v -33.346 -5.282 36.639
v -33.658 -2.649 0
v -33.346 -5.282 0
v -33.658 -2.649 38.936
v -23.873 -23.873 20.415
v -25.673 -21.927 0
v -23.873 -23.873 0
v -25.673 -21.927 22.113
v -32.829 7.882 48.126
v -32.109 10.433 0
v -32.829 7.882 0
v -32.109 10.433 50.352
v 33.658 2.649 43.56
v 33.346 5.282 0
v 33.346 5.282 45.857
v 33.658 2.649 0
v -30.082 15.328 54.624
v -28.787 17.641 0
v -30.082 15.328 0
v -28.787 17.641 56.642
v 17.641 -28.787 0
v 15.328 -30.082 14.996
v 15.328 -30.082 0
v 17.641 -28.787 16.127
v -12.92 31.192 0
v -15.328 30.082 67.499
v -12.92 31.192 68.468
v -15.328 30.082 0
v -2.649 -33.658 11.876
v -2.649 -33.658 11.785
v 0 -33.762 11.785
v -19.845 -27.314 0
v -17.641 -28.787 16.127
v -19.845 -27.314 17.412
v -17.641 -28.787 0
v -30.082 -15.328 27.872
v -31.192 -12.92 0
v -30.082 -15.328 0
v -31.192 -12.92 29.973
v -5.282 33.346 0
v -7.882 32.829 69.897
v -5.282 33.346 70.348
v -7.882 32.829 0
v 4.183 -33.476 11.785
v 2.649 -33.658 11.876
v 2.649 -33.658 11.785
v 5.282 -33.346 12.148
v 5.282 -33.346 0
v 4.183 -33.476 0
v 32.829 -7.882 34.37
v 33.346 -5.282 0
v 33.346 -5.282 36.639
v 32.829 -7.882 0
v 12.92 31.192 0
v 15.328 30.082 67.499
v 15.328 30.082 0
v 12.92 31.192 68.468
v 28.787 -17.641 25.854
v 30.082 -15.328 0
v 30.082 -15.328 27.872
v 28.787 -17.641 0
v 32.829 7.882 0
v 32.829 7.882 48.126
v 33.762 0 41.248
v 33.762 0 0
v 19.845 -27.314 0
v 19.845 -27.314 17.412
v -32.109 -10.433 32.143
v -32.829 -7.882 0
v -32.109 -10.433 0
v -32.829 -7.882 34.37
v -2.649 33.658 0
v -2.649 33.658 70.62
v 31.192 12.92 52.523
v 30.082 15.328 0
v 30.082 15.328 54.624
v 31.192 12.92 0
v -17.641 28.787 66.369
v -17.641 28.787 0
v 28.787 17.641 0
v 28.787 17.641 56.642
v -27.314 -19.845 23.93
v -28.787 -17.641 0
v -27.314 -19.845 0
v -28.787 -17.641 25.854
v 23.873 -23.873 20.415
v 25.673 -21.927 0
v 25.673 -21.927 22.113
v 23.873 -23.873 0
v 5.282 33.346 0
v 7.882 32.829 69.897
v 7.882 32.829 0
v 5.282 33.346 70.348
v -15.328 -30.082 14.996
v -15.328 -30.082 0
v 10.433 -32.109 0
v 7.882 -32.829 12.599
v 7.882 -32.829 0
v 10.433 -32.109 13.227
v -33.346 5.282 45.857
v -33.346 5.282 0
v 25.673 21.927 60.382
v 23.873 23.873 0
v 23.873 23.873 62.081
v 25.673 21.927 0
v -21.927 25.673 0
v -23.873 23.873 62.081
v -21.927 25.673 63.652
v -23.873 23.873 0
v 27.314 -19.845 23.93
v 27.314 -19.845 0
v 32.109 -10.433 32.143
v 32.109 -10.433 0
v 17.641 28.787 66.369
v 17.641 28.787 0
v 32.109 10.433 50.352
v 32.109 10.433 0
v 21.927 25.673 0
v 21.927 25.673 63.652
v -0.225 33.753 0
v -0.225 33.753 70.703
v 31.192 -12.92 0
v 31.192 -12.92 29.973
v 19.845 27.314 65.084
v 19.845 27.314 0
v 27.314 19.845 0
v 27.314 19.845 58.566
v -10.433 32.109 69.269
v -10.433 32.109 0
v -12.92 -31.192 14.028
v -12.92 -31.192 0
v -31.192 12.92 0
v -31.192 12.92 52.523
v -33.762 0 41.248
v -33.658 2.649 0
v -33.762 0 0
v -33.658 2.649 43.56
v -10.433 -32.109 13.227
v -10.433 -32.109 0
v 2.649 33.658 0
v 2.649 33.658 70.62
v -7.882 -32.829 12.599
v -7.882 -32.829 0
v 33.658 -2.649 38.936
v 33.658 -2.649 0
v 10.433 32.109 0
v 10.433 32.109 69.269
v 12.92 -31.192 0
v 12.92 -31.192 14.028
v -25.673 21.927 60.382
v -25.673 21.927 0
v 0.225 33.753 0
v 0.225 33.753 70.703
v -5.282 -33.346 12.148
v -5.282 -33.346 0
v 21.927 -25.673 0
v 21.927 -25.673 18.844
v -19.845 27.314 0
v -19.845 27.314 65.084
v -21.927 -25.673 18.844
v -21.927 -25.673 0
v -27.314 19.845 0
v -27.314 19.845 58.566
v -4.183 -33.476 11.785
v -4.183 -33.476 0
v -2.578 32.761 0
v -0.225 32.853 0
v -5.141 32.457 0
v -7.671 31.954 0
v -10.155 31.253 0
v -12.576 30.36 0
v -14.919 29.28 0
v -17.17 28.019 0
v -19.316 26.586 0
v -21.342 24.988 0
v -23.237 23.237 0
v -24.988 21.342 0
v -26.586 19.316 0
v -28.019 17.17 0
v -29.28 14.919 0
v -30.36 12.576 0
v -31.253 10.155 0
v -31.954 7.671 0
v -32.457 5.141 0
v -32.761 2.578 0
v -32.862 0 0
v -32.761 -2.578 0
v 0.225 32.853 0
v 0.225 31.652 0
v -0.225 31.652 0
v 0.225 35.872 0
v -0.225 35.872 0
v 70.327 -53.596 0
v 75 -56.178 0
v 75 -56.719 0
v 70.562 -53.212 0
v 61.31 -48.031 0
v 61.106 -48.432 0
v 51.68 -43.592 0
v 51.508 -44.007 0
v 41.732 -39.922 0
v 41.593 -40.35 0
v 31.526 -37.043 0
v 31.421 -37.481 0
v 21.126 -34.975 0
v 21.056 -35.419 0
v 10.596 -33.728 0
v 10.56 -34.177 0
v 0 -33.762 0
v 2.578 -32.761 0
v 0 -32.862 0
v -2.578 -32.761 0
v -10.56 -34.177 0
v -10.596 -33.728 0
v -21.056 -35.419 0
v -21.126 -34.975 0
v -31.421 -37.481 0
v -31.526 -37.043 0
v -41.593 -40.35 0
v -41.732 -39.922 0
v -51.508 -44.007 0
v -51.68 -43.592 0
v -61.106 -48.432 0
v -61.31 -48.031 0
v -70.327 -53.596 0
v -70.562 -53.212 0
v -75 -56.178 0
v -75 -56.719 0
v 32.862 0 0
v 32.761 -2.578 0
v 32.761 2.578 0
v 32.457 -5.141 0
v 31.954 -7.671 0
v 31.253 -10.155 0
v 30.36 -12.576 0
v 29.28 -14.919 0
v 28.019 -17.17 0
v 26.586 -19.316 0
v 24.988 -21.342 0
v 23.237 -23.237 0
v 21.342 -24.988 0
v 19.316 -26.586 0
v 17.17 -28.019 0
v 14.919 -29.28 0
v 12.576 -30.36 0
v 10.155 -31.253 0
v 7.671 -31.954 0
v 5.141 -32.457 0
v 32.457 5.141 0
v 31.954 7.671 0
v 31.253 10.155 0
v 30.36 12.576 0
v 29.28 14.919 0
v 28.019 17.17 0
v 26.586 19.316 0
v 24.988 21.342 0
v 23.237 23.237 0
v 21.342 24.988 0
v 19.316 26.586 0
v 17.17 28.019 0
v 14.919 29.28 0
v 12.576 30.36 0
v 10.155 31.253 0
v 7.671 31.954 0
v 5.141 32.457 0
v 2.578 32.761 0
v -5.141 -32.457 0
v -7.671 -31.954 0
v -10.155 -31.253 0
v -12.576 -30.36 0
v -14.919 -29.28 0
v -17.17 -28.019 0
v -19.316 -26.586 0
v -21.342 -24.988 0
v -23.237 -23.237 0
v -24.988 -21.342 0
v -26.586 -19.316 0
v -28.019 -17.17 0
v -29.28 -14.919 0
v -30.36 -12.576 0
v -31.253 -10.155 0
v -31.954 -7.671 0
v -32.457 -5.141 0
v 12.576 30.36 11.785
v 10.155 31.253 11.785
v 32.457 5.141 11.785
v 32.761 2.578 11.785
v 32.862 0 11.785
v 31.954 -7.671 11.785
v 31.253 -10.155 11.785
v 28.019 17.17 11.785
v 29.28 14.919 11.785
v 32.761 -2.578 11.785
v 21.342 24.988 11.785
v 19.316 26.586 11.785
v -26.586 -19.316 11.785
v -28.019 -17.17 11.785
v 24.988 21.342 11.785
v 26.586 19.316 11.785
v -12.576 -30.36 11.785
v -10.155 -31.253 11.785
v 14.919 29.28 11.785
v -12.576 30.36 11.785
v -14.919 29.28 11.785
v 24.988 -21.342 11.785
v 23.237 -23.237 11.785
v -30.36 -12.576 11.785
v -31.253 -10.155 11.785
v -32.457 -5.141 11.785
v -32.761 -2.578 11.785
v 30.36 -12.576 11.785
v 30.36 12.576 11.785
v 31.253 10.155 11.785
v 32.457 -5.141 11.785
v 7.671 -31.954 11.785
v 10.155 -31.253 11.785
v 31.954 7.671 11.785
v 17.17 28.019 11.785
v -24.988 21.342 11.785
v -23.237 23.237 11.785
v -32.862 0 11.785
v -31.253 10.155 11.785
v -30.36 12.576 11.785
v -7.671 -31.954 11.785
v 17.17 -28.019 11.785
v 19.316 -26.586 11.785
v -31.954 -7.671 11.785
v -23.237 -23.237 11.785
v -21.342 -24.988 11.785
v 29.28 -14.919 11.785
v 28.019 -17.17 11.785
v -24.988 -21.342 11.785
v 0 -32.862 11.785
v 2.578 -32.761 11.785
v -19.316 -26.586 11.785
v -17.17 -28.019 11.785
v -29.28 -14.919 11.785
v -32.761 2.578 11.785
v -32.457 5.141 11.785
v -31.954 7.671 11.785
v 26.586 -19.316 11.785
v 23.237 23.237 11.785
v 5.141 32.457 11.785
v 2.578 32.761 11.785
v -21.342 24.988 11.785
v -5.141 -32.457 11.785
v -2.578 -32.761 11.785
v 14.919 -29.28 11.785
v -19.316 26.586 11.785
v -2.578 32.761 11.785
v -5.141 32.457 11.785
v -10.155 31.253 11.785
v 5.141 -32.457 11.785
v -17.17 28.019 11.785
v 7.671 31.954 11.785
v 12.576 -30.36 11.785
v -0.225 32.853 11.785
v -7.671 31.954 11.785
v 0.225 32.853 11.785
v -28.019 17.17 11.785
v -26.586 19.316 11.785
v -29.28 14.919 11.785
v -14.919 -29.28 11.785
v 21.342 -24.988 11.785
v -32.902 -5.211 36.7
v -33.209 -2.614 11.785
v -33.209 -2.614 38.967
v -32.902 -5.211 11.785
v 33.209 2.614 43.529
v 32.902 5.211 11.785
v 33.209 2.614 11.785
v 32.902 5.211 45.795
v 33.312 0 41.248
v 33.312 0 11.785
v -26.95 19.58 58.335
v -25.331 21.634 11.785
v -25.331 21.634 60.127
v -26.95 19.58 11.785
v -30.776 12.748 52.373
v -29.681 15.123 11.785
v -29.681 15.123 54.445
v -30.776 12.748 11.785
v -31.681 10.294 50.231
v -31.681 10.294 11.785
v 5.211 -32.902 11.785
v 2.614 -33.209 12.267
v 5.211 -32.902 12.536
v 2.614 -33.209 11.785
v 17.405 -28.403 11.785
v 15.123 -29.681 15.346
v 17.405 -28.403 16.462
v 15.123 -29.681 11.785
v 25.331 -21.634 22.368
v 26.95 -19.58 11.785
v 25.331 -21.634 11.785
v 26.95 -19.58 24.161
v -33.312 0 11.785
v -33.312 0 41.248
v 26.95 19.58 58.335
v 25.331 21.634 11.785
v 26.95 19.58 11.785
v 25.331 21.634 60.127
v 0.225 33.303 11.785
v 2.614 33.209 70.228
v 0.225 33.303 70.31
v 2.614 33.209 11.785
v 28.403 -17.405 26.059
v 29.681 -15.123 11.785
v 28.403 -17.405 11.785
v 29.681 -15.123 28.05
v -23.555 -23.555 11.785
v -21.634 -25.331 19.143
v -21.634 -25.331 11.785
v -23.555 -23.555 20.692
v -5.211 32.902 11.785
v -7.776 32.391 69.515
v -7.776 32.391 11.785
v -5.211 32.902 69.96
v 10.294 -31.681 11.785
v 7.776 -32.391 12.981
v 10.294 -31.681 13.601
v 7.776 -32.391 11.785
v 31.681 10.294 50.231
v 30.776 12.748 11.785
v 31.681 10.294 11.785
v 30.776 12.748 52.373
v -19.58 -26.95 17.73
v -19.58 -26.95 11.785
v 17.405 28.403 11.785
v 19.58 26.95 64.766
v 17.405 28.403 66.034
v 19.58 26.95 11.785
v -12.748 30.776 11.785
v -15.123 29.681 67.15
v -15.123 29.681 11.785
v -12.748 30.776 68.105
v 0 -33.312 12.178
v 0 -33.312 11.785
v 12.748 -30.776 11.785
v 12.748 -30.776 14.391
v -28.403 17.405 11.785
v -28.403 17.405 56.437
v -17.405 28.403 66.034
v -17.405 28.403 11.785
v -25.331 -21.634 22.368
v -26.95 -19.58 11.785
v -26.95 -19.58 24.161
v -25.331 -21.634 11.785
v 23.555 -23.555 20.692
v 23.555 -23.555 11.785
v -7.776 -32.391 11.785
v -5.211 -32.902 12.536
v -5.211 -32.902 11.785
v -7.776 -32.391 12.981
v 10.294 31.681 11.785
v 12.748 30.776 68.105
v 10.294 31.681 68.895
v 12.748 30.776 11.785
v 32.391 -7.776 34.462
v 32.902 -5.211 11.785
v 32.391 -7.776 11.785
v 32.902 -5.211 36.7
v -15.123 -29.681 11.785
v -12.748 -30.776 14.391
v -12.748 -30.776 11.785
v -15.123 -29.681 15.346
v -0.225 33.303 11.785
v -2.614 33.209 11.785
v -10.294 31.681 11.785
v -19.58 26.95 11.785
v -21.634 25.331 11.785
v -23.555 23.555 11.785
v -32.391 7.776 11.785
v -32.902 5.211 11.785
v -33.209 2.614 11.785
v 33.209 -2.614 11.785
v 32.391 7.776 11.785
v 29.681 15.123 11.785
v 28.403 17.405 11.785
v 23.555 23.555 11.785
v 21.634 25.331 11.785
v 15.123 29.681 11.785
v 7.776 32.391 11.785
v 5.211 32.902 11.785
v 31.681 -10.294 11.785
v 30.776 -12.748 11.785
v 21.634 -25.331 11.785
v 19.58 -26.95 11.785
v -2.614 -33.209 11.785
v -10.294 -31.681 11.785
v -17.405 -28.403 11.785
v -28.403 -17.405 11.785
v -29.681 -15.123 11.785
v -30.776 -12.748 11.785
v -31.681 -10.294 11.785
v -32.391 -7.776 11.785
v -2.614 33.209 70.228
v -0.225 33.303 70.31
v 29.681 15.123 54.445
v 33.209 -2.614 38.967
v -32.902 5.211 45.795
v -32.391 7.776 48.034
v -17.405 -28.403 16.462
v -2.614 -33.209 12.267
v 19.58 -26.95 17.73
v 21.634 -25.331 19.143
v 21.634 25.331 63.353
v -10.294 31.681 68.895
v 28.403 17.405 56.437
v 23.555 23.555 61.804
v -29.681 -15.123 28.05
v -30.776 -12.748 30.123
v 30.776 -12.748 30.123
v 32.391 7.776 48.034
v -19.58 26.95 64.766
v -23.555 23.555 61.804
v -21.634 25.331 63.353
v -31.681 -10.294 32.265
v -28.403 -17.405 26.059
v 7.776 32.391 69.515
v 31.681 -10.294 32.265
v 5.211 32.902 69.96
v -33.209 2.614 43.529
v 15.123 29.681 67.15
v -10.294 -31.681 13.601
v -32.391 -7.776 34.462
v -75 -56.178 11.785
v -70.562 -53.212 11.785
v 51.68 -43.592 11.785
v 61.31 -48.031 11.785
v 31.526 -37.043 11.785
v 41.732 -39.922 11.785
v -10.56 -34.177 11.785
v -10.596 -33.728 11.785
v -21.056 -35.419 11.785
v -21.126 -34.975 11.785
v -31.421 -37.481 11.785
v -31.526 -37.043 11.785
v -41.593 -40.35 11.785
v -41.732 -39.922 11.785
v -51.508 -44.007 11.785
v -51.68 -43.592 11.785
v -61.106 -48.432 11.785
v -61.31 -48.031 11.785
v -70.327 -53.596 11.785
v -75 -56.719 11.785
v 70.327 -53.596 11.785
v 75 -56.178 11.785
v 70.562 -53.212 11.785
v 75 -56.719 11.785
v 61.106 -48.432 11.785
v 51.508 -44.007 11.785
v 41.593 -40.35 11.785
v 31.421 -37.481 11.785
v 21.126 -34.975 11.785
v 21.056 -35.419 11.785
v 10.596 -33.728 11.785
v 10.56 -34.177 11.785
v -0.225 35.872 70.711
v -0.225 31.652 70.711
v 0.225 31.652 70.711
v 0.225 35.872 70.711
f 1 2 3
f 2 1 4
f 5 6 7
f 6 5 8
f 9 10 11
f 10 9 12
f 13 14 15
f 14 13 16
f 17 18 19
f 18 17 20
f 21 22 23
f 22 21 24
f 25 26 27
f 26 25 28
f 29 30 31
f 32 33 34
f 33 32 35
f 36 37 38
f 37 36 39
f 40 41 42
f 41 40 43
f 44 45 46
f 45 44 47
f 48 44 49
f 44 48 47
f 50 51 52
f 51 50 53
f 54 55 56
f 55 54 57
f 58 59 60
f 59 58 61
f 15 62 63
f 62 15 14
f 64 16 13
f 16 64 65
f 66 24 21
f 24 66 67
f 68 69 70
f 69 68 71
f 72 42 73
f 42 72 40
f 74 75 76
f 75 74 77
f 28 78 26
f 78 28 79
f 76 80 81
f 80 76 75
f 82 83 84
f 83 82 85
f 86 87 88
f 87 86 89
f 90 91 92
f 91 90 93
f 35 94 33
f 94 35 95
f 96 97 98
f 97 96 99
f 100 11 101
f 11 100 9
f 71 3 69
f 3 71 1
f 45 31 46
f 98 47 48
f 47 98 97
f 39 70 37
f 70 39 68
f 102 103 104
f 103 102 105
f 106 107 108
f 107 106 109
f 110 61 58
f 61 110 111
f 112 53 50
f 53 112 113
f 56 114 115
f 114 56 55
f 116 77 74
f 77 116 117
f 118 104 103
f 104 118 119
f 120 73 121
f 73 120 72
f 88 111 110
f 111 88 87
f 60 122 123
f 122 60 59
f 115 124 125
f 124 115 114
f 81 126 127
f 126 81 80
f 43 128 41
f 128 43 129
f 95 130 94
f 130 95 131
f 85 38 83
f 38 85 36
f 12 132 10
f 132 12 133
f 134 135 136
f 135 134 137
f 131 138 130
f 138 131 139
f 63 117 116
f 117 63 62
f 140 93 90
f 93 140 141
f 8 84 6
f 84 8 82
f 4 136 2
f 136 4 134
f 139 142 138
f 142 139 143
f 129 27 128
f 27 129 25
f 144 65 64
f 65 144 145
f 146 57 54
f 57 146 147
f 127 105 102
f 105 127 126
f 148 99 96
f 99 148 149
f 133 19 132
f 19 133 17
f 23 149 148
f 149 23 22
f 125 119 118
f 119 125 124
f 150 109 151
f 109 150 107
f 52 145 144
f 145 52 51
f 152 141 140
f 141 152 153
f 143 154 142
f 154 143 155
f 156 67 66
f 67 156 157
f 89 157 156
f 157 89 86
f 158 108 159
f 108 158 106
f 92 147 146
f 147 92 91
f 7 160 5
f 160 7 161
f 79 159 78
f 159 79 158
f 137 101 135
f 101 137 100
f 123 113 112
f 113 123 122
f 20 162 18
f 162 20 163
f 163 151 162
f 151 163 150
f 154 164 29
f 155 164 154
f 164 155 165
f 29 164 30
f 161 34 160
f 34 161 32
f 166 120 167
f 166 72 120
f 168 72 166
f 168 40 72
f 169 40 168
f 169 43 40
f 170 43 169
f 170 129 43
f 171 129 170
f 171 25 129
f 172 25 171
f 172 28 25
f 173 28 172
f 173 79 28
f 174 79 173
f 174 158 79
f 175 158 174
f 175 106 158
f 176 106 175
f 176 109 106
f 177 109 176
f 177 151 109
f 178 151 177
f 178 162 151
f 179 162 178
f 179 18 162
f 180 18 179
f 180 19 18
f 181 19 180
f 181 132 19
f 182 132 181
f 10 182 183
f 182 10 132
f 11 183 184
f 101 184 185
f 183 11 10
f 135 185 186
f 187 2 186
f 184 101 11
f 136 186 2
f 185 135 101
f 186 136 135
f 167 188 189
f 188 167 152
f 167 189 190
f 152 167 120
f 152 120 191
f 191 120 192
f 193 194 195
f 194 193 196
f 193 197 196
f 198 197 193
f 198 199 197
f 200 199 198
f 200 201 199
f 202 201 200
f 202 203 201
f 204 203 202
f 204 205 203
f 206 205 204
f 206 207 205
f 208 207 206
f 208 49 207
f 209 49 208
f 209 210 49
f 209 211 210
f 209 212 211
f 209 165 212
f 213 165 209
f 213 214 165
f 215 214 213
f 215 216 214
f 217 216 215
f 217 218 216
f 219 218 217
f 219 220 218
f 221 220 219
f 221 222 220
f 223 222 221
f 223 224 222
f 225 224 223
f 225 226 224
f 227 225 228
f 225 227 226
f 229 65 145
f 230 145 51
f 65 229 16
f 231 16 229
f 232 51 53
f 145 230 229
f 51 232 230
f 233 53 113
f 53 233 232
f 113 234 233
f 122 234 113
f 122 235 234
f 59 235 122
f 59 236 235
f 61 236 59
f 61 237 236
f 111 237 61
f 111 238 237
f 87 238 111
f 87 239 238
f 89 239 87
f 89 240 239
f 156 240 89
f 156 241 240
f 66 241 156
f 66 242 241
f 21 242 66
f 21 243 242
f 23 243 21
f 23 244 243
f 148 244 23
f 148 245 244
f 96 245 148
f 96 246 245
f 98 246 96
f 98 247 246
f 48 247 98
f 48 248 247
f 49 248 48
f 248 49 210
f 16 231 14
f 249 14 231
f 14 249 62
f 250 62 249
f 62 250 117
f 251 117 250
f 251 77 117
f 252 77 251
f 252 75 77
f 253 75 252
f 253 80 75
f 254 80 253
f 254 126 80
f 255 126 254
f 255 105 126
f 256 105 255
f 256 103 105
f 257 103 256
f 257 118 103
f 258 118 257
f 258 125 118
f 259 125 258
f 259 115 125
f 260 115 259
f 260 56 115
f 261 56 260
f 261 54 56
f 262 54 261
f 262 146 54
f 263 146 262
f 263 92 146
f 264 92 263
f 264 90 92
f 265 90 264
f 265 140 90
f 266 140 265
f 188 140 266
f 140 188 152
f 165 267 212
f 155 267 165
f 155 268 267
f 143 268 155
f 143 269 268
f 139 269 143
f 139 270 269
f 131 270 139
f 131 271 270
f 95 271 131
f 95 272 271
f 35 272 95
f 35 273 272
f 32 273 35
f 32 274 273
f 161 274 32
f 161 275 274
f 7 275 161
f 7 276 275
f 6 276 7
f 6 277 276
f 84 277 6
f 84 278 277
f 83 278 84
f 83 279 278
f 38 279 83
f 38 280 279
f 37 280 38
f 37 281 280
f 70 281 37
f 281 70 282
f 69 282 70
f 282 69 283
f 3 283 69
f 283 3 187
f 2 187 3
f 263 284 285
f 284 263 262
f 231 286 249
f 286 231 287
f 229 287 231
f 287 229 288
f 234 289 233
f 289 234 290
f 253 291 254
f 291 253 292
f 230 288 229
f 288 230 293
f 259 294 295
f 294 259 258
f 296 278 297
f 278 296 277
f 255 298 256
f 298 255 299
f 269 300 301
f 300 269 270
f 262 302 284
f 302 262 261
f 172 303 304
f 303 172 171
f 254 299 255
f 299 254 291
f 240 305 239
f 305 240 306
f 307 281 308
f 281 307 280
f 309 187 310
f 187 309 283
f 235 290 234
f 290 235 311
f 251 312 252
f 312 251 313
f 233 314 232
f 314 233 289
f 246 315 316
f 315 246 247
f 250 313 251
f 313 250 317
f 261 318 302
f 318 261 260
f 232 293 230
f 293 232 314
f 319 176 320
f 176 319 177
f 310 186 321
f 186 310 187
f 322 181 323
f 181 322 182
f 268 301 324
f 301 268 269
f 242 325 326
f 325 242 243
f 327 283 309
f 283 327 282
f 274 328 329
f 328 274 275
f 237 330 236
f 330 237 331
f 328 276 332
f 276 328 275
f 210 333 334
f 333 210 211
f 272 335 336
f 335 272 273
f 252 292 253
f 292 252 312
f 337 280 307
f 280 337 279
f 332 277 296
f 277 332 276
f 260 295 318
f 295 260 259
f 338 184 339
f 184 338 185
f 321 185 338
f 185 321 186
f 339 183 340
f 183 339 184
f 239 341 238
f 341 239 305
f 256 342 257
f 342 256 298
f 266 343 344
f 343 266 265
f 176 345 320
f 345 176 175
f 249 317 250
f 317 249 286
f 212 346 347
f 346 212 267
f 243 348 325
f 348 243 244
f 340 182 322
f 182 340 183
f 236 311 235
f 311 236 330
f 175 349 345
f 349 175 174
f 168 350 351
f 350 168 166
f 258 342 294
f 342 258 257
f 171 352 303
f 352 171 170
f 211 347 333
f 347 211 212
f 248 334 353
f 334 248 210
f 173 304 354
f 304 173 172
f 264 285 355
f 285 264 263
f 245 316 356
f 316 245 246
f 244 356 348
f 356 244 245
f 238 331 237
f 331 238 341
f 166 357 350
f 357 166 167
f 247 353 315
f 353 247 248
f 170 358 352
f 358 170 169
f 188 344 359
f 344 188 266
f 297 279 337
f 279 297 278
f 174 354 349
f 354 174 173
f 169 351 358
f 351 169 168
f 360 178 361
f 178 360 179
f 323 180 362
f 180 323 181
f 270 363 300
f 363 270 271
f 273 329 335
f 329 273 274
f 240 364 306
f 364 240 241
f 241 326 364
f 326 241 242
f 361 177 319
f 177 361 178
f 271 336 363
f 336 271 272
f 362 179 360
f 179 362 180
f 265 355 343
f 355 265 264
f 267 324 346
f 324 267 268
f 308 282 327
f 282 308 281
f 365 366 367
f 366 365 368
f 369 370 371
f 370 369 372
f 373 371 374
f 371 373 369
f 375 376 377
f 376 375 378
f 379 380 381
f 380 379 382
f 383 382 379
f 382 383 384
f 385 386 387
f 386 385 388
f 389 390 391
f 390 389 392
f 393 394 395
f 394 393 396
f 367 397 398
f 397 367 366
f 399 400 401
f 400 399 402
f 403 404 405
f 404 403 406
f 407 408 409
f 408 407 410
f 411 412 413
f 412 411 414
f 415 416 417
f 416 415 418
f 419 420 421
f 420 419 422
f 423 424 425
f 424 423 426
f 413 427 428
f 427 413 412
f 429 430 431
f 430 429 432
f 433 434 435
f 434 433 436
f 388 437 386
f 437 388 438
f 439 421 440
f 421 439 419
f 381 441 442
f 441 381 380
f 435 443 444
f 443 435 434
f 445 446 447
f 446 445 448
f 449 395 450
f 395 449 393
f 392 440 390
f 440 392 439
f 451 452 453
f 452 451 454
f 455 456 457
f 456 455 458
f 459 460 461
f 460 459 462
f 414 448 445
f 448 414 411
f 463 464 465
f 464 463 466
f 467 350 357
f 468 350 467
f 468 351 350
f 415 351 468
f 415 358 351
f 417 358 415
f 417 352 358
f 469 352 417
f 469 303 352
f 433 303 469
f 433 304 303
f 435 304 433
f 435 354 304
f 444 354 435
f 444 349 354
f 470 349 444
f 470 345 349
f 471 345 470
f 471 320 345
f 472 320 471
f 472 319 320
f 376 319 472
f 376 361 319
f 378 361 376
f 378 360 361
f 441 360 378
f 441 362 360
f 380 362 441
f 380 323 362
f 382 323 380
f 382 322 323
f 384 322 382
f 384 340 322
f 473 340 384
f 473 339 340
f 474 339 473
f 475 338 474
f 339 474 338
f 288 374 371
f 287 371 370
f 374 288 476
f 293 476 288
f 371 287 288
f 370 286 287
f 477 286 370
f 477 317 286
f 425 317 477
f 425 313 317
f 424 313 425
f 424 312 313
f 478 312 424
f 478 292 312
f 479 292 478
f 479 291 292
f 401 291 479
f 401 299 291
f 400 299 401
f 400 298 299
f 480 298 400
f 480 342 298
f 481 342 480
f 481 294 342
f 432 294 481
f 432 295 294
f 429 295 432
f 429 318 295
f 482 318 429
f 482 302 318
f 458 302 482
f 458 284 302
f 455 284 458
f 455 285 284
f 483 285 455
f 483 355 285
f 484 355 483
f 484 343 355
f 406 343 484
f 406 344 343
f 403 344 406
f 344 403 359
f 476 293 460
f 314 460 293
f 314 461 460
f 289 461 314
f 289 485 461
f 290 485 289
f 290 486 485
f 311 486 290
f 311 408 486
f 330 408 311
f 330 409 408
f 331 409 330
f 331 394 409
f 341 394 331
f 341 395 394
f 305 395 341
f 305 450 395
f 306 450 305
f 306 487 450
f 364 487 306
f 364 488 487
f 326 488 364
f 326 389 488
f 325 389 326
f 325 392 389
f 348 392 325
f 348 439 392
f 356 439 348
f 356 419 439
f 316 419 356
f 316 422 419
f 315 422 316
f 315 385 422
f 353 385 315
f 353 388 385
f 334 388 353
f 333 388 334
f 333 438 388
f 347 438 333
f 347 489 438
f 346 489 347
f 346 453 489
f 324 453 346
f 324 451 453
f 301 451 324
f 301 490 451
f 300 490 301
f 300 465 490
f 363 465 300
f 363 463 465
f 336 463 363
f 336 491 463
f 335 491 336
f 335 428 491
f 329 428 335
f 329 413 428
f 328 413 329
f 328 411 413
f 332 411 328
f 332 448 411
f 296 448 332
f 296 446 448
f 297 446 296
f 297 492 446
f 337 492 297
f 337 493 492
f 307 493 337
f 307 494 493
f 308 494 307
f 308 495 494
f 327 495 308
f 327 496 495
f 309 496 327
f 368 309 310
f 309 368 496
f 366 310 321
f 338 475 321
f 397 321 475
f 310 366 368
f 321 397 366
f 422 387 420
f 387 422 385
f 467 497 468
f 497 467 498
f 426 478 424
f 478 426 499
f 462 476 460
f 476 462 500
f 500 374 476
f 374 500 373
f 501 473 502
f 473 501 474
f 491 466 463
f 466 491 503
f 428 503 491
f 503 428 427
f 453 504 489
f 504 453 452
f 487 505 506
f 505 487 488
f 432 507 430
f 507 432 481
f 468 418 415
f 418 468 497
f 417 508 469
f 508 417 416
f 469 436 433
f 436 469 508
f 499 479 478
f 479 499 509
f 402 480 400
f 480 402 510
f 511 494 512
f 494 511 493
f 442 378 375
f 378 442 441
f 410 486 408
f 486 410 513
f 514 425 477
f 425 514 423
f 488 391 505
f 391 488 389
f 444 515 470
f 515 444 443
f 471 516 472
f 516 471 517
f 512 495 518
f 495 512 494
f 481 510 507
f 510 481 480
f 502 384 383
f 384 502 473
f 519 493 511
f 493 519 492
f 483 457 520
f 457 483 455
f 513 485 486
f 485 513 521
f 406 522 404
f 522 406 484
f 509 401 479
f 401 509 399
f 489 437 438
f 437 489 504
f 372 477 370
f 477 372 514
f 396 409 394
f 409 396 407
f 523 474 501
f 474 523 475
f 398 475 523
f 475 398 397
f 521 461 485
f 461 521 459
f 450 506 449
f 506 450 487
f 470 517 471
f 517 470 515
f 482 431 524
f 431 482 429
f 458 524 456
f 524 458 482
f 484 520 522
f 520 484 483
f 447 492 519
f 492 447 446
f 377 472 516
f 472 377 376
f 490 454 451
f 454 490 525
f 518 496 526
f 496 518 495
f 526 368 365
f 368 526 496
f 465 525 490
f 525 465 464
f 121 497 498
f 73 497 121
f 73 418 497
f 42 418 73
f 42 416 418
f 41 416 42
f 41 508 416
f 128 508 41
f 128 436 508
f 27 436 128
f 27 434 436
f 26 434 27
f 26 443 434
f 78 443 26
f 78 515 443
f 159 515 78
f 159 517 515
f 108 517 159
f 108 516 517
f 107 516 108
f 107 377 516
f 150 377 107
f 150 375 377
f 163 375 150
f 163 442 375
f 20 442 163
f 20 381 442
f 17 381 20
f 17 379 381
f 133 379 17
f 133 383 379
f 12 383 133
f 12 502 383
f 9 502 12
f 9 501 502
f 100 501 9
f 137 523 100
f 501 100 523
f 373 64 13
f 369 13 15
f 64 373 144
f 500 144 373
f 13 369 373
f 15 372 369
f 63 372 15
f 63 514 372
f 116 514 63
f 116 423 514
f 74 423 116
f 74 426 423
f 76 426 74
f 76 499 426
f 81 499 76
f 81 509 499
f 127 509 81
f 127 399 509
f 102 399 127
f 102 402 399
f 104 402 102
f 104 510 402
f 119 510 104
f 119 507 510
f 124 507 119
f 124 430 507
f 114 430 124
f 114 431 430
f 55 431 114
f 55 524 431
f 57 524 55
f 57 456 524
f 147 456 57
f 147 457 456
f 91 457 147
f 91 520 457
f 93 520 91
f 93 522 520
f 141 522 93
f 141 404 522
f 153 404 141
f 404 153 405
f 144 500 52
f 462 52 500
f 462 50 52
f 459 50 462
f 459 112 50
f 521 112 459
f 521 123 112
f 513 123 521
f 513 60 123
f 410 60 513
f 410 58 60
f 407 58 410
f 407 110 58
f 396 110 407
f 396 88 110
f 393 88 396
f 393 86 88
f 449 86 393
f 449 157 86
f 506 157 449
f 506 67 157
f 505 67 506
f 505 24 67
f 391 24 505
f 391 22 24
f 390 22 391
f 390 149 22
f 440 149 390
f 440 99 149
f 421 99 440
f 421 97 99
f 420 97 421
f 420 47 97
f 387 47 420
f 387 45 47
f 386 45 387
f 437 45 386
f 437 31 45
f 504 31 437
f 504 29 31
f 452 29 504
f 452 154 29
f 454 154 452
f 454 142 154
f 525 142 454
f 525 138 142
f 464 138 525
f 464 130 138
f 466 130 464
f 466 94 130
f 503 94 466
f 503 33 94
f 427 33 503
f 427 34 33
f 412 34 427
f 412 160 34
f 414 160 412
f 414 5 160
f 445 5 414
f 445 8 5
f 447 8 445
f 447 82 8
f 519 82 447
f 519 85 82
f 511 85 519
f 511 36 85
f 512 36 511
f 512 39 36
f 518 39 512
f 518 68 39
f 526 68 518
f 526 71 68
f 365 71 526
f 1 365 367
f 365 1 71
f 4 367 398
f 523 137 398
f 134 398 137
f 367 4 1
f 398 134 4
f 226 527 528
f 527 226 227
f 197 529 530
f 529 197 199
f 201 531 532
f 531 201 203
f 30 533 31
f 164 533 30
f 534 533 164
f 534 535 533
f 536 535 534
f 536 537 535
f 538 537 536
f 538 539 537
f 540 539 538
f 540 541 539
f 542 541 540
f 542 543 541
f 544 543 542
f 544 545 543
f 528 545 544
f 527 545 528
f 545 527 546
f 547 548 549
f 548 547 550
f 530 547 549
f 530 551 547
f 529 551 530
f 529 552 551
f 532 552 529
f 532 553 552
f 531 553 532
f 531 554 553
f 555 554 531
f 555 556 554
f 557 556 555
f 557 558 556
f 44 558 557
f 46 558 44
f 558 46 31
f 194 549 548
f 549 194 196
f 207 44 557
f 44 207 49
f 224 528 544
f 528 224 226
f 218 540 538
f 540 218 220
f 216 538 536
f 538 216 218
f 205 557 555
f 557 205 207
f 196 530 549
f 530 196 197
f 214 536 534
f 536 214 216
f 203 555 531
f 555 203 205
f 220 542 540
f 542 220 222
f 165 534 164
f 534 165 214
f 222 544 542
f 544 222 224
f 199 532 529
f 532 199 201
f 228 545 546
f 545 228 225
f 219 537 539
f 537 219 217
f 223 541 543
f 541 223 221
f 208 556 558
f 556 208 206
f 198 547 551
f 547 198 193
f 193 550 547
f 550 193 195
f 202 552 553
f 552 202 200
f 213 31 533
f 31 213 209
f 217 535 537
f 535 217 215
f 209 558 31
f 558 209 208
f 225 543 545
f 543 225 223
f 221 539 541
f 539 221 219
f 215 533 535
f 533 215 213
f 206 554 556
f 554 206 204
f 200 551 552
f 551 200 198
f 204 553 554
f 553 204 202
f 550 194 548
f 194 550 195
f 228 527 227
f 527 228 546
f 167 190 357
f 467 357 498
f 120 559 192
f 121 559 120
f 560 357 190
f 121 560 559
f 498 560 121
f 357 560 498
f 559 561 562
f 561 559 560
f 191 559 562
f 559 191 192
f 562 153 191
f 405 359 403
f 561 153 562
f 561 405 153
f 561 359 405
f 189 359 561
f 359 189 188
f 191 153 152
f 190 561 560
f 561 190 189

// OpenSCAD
/*

Jim Gile
Ring Flyer

*/

$fn= 80; // Smoothness setting

tk = .45;
base = 150;
minHtRatio = 6;
cir = sqrt(pow(base,2)+pow(base,2));
rad = cir/(2*PI);
diam = 2*rad;
ht = cir/3;
minHt = ht/minHtRatio;
sliceAngle = atan2(ht-minHt,diam);
echo("cir=",cir,"ht=",ht,"minHt=",minHt,"sliceAngle=",sliceAngle);

scale([1,1,1]) {
    //Main Cylinder
    difference() {
        cylinder(r=rad,h=ht,center=false);
        translate([0,0,-1])cylinder(r=rad-(2*tk),h=ht+2,center=false);
        translate([0,0,minHt])cylinder(r=rad-tk,h=ht,center=false);
        translate([-(diam+1)/2,-rad,minHt])rotate([sliceAngle,0,0])cube([diam+2,base+2,ht],center=false);
    }
    //Upper Wing
    difference() {
        translate([0,tk-diam*2.5,0])cylinder(r=diam*2,h=minHt,center=false);
        translate([0,tk-diam*2.5,-1])cylinder(r=diam*2-tk,h=minHt+2,center=false);
        translate([diam*2+base/2,-diam*2.5,minHt/2])cube([diam*4,diam*4,minHt*2],center=true);
        translate([-diam*2-base/2,-diam*2.5,minHt/2])cube([diam*4,diam*4,minHt*2],center=true);
        translate([0,-diam*3,minHt/2])cube([diam*4,diam*4,minHt*2],center=true);
    }
    //Rudder
    hull() {
        translate([0,rad,minHt/2])cube([tk,rad/8,minHt],center=true);
        translate([0,rad,ht-minHt/2])cube([tk,rad/8,minHt],center=true);
    }    
}
